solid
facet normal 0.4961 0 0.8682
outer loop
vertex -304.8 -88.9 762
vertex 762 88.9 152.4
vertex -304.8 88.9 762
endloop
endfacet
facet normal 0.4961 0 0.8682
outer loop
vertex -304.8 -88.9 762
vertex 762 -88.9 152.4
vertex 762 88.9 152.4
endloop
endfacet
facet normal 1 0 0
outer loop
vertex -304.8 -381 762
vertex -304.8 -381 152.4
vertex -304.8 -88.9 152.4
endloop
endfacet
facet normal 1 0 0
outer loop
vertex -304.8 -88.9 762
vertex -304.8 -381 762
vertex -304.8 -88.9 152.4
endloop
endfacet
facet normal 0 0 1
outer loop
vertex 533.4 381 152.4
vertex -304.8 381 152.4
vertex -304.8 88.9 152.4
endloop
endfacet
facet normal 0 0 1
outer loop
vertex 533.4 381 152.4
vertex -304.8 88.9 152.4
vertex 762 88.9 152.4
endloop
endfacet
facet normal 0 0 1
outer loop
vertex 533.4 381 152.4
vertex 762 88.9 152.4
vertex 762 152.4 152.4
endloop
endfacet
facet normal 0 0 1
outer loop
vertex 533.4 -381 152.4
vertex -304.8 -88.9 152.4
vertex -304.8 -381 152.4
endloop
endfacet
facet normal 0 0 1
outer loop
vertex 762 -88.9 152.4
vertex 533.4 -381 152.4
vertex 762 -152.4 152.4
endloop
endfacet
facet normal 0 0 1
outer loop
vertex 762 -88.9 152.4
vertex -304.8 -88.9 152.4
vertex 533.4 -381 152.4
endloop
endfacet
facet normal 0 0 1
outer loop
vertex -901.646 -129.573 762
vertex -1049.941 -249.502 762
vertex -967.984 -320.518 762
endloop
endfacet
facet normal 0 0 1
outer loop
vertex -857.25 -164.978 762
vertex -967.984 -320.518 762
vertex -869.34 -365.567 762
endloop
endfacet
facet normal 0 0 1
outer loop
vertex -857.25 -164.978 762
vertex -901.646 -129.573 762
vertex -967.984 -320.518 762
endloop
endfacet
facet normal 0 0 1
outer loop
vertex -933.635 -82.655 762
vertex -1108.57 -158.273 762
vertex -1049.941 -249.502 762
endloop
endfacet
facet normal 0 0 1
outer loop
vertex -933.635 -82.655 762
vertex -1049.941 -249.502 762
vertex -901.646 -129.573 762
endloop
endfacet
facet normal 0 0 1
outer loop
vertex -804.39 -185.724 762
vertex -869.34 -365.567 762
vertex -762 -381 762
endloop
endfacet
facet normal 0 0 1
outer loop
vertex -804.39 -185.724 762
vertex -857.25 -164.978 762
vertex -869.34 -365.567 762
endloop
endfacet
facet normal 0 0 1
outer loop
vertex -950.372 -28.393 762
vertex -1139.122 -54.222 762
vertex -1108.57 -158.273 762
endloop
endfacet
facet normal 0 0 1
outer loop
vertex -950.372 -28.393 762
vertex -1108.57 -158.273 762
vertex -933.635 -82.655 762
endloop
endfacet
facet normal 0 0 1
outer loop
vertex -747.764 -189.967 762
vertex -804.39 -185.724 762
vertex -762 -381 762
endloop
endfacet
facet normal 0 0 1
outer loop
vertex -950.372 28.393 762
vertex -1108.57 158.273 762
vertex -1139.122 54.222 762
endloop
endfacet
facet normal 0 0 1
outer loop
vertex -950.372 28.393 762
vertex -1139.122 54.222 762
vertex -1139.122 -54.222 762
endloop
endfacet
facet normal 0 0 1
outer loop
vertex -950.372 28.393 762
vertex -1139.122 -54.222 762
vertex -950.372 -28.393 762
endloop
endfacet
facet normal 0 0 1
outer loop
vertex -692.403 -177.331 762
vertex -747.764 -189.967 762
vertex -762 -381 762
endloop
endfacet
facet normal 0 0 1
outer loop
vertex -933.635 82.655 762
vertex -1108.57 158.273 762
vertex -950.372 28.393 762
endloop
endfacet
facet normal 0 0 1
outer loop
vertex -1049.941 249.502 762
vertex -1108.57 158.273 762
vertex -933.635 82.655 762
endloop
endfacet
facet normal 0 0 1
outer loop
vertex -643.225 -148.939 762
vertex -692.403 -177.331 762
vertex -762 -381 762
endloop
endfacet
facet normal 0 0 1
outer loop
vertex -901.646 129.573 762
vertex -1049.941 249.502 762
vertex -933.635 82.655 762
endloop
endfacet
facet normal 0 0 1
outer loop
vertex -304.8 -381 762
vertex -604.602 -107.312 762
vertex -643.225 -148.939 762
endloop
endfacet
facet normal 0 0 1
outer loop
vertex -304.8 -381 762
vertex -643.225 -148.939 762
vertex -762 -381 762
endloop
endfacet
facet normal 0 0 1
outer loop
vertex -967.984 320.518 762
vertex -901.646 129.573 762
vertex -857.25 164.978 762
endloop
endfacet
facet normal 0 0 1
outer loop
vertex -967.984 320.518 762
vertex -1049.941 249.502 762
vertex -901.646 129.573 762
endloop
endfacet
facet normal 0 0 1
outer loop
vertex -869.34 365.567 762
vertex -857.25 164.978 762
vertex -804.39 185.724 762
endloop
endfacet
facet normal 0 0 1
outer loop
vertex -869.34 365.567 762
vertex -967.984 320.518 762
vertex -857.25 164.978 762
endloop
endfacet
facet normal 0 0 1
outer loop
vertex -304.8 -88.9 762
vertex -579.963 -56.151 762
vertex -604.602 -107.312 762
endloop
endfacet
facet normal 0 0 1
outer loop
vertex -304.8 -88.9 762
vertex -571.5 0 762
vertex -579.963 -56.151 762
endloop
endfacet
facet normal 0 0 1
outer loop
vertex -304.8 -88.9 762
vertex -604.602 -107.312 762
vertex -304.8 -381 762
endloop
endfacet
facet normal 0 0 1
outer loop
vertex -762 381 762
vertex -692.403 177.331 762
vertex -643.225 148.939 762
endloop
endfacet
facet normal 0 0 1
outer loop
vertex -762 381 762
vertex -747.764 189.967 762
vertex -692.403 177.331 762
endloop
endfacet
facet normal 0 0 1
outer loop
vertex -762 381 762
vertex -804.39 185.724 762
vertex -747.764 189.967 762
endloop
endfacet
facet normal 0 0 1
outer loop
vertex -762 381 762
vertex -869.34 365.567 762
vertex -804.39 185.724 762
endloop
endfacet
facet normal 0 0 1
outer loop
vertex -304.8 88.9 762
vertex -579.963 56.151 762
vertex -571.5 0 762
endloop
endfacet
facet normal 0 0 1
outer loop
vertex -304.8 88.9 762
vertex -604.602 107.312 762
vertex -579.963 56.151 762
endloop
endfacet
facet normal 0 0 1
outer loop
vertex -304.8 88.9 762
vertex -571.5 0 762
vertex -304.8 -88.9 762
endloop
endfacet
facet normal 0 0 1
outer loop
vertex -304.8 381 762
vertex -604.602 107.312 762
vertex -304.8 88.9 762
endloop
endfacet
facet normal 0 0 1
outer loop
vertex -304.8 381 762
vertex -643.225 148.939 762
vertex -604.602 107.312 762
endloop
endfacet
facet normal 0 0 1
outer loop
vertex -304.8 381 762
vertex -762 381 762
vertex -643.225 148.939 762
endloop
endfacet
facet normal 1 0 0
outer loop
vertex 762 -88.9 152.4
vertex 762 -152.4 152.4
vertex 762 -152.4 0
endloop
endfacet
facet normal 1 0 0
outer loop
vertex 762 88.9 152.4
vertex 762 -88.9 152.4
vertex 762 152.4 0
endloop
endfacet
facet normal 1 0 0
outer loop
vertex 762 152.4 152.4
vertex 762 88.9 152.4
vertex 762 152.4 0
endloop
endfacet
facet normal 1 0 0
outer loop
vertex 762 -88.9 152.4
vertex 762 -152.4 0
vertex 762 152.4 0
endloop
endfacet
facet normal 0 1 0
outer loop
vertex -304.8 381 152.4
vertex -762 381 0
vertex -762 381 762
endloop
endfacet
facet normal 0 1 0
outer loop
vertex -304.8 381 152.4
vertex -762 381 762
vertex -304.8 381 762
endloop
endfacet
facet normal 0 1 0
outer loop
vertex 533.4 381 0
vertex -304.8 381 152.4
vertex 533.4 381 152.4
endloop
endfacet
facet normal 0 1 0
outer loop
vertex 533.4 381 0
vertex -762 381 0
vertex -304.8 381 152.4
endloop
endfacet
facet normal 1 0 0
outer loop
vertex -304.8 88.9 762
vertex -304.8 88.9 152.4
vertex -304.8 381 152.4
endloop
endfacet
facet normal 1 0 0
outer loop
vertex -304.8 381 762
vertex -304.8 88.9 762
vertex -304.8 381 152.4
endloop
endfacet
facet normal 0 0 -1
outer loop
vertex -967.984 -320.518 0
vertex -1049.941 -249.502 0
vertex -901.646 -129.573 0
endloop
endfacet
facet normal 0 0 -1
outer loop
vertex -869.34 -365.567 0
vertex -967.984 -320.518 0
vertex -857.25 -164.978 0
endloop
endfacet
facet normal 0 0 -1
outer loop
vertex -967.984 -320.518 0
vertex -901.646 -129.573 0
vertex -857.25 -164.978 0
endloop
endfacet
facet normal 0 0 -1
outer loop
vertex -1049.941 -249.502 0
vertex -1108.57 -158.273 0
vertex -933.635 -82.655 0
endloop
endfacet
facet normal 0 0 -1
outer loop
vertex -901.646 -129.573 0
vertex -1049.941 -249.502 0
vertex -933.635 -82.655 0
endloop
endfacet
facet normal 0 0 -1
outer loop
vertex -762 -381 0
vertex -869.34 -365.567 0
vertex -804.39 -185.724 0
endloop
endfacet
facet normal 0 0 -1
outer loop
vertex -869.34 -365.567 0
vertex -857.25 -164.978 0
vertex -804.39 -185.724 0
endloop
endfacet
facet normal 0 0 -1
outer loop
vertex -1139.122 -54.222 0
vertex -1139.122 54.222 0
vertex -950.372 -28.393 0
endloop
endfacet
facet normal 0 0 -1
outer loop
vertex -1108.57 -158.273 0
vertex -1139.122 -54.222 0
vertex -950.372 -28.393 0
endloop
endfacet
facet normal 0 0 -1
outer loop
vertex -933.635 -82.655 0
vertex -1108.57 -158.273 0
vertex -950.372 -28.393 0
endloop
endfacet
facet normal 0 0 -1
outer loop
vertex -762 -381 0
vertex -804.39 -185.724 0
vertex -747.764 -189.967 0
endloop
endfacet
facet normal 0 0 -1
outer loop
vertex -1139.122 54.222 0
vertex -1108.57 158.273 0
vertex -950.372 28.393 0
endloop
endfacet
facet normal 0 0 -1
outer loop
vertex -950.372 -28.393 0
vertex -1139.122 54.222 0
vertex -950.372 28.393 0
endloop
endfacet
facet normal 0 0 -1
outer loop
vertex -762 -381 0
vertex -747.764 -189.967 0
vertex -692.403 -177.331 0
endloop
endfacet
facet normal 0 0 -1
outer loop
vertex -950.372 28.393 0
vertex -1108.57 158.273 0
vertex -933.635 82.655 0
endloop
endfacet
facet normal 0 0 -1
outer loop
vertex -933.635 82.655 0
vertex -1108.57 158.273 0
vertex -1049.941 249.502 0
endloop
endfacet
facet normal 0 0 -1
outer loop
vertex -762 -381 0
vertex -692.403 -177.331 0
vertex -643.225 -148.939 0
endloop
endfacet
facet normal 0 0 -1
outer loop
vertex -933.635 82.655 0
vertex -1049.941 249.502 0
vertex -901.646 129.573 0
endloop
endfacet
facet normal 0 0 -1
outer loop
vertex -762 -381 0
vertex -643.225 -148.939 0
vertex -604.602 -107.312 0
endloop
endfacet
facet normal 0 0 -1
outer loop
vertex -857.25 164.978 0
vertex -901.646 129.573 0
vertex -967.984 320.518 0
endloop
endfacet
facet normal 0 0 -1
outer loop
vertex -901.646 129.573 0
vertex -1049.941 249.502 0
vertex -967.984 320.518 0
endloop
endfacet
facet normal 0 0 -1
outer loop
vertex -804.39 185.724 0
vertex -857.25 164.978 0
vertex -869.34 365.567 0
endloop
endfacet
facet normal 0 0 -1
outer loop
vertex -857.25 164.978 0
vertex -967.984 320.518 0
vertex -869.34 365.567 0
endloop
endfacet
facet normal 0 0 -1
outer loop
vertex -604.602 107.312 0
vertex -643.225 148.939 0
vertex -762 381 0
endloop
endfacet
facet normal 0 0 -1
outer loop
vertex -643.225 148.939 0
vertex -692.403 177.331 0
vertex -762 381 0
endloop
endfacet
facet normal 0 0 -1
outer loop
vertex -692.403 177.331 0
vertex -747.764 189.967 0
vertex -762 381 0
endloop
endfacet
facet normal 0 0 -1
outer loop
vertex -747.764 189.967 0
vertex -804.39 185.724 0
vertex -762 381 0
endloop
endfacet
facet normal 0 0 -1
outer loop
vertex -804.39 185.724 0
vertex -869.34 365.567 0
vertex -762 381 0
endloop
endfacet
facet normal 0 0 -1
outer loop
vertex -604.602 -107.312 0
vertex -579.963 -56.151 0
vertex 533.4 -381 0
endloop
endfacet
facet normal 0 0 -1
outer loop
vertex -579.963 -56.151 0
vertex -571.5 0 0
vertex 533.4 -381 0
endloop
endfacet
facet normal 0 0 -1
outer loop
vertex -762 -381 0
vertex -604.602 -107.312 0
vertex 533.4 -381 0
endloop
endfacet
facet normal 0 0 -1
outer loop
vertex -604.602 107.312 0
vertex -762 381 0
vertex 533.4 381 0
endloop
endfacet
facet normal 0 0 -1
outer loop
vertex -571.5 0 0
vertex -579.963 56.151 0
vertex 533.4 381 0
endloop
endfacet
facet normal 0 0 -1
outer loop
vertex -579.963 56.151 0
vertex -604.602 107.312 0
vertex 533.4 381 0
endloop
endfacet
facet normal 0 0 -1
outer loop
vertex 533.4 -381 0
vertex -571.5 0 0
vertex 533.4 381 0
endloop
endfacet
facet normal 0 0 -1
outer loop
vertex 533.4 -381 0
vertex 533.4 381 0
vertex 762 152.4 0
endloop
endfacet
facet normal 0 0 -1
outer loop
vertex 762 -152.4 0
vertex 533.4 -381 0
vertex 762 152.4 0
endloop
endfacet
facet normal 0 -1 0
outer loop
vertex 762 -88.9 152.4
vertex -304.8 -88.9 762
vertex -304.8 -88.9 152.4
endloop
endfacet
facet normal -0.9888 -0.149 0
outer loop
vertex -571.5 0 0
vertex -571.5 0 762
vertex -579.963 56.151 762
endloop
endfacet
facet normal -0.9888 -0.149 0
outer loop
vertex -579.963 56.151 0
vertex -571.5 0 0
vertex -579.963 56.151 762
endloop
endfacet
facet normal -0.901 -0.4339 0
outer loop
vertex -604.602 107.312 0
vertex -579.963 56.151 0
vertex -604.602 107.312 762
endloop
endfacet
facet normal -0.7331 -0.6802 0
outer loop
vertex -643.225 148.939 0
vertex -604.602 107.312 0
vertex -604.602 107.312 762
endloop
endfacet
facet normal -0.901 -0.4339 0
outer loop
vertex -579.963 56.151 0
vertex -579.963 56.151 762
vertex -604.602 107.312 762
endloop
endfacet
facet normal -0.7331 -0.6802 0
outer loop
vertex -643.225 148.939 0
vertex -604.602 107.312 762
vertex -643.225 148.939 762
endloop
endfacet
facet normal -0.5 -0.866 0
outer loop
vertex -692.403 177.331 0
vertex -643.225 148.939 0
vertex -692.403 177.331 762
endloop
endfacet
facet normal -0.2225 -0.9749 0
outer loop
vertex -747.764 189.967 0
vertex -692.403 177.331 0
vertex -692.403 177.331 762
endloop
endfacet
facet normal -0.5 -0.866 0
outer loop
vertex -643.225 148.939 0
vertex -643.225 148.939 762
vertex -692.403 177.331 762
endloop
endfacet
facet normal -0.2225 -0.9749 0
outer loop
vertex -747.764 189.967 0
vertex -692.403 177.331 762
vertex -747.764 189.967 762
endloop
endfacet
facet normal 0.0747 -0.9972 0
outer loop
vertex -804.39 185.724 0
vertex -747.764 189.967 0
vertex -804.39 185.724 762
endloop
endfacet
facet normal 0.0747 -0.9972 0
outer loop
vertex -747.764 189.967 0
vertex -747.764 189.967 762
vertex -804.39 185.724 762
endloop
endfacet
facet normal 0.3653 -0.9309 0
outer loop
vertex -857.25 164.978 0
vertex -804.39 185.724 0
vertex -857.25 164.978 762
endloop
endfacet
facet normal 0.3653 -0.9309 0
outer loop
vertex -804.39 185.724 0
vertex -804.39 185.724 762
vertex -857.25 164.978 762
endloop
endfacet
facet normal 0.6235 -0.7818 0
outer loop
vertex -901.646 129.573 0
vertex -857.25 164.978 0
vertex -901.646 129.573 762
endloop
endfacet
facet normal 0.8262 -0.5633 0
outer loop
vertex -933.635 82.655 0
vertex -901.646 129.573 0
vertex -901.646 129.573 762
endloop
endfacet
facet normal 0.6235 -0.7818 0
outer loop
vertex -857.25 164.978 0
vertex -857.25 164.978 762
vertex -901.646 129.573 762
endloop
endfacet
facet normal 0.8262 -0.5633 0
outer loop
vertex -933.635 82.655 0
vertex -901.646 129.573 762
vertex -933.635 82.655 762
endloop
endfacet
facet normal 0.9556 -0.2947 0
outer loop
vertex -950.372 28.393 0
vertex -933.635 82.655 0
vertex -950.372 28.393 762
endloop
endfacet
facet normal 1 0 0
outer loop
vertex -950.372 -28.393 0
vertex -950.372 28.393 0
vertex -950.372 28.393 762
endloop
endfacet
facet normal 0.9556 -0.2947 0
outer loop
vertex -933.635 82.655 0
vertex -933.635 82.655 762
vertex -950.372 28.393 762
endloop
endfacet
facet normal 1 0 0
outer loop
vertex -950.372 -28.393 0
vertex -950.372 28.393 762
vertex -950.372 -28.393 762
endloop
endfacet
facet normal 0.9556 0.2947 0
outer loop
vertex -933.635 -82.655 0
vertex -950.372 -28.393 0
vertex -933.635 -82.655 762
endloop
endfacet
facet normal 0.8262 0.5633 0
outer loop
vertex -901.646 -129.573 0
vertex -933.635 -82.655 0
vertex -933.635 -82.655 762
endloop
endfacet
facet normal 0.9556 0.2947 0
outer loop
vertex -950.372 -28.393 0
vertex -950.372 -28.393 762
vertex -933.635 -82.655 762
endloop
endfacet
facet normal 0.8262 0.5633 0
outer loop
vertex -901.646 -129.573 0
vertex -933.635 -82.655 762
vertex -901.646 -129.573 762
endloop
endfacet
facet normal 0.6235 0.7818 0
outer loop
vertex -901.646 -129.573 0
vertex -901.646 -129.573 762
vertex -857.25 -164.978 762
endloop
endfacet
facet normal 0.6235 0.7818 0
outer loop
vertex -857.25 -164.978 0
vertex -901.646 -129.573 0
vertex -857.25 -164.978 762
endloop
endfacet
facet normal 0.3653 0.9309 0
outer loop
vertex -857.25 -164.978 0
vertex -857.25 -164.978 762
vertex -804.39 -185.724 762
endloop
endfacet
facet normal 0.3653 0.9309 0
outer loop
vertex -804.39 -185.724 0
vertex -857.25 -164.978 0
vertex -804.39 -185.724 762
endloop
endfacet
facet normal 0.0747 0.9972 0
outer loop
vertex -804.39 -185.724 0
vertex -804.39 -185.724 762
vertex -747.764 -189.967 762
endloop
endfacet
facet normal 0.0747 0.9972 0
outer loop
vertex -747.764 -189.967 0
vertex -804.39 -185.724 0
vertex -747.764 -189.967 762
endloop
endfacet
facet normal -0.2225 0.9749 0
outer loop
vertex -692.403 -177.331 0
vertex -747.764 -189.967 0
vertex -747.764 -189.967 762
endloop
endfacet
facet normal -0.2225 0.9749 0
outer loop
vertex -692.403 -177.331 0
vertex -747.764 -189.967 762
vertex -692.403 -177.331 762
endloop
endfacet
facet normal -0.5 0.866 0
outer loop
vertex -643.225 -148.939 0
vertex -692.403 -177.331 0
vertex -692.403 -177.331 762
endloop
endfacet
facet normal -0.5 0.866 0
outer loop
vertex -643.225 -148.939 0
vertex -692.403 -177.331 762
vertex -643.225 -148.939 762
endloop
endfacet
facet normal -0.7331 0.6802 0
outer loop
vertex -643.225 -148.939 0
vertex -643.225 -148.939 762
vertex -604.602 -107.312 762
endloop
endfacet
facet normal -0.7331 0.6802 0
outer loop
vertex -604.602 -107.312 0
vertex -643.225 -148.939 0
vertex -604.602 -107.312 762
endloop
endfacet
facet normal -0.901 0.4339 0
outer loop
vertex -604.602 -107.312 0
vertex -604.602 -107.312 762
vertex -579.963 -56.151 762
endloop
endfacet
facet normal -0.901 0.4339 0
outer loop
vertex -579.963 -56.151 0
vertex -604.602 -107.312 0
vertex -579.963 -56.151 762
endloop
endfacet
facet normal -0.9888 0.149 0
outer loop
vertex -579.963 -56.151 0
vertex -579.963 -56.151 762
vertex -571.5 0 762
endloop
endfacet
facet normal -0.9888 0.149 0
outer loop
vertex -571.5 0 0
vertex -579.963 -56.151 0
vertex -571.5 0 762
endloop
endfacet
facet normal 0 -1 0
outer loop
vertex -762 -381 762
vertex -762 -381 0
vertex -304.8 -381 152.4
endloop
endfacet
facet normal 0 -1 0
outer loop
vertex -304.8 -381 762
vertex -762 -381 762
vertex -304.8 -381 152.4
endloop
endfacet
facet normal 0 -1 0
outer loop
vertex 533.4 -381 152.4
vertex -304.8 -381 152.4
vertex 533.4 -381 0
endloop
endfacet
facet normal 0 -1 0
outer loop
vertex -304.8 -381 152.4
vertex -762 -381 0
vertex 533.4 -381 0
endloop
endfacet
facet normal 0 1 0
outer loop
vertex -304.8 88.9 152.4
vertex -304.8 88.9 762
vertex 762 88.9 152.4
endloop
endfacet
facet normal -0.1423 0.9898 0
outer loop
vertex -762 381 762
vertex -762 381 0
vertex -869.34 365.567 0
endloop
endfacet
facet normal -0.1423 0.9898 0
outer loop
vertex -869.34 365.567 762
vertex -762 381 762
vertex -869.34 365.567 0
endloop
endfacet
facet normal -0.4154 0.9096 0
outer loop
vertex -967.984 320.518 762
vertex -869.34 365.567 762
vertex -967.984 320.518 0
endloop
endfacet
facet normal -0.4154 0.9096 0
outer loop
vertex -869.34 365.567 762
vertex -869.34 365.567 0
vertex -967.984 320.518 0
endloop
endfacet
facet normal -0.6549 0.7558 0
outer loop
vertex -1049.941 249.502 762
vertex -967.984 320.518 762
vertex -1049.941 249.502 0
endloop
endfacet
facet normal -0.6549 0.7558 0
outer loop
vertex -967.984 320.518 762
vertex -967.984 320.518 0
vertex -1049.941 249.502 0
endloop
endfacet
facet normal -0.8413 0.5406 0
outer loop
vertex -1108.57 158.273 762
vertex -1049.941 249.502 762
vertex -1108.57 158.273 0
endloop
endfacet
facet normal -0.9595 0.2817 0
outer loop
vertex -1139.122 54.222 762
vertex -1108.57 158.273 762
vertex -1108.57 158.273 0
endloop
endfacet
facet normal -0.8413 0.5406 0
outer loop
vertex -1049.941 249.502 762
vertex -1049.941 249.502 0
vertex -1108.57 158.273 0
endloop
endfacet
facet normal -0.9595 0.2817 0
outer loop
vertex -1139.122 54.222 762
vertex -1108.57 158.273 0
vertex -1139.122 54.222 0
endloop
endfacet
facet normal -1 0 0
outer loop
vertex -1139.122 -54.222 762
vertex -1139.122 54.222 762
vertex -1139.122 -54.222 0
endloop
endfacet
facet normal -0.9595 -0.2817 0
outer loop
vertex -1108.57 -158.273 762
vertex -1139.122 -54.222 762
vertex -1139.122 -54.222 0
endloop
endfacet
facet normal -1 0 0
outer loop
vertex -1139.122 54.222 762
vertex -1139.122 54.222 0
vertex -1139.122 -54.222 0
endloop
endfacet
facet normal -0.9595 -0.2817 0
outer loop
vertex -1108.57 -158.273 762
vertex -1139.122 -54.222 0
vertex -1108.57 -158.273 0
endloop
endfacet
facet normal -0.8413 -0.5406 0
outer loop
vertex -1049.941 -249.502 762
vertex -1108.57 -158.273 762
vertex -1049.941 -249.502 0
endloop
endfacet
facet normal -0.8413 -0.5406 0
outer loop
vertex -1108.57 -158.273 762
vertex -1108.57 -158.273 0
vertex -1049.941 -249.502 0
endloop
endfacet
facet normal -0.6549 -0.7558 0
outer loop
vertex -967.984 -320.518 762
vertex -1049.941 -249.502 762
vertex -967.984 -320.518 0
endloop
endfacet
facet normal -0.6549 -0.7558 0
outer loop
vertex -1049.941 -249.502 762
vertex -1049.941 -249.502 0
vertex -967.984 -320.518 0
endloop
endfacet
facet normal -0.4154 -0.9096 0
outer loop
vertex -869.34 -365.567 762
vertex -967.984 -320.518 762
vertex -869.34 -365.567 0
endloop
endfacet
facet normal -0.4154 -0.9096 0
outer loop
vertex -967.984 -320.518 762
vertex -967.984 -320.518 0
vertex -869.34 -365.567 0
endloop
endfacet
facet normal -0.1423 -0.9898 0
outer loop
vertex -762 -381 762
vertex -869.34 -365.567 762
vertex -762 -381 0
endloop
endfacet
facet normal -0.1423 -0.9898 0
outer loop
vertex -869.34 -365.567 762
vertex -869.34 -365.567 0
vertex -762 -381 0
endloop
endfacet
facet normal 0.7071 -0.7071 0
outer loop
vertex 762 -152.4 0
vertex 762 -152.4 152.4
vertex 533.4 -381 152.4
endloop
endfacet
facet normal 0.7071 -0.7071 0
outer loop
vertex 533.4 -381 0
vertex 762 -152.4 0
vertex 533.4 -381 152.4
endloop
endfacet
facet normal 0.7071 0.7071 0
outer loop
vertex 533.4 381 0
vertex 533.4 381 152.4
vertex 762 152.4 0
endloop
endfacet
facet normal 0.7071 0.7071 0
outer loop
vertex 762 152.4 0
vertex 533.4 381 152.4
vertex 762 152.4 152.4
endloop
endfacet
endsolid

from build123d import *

# Parameters (mm, degrees)
F0_W     = 1524
F0_H     = 762
F1_DEPTH = 152.4
F2_W     = 457.2
F2_H     = 762
F3_DEPTH = 609.6
F5_DEPTH = 88.9
F6_R     = 190.5
F7_DEPTH = 1524
F9_DEPTH = 152.4


with BuildPart() as f1:
    # F0 (on Top) → F1 (new body)
    with BuildSketch(Plane.XY):
        Rectangle(F0_W, F0_H)
        with BuildLine():
            Line((-762, -381), (-762, 381))
            ThreePointArc((-762, 381), (-1143, 0), (-762, -381))
        make_face()
    extrude(amount=F1_DEPTH)

    # F2 (on face) → F3 (join)
    with BuildSketch(Plane.XY.offset(152.4)):
        with BuildLine():
            Line((-762, -381), (-762, 381))
            ThreePointArc((-762, 381), (-1143, 0), (-762, -381))
        make_face()
        with Locations((-533.4, 0)):
            Rectangle(F2_W, F2_H)
    extrude(amount=F3_DEPTH)

    # F4 (on Front) → F5 (join, symmetric)
    with BuildSketch(Plane.XZ):
        Polygon((762, 152.4), (-304.8, 762), (-304.8, 152.4), align=None)
    extrude(amount=F5_DEPTH, both=True)

    # F6 (on face) → F7 (cut)
    with BuildSketch(Plane.XY.offset(762)):
        with Locations((-762, 0)):
            Circle(F6_R)
    extrude(amount=-F7_DEPTH, mode=Mode.SUBTRACT)

    # F8 (on face) → F9 (cut)
    with BuildSketch(Plane.XY.offset(152.4)):
        Polygon((762, 381), (533.4, 381), (762, 152.4), align=None)
        Polygon((762, -381), (762, -152.4), (533.4, -381), align=None)
    extrude(amount=-F9_DEPTH, mode=Mode.SUBTRACT)


solid = f1.part
